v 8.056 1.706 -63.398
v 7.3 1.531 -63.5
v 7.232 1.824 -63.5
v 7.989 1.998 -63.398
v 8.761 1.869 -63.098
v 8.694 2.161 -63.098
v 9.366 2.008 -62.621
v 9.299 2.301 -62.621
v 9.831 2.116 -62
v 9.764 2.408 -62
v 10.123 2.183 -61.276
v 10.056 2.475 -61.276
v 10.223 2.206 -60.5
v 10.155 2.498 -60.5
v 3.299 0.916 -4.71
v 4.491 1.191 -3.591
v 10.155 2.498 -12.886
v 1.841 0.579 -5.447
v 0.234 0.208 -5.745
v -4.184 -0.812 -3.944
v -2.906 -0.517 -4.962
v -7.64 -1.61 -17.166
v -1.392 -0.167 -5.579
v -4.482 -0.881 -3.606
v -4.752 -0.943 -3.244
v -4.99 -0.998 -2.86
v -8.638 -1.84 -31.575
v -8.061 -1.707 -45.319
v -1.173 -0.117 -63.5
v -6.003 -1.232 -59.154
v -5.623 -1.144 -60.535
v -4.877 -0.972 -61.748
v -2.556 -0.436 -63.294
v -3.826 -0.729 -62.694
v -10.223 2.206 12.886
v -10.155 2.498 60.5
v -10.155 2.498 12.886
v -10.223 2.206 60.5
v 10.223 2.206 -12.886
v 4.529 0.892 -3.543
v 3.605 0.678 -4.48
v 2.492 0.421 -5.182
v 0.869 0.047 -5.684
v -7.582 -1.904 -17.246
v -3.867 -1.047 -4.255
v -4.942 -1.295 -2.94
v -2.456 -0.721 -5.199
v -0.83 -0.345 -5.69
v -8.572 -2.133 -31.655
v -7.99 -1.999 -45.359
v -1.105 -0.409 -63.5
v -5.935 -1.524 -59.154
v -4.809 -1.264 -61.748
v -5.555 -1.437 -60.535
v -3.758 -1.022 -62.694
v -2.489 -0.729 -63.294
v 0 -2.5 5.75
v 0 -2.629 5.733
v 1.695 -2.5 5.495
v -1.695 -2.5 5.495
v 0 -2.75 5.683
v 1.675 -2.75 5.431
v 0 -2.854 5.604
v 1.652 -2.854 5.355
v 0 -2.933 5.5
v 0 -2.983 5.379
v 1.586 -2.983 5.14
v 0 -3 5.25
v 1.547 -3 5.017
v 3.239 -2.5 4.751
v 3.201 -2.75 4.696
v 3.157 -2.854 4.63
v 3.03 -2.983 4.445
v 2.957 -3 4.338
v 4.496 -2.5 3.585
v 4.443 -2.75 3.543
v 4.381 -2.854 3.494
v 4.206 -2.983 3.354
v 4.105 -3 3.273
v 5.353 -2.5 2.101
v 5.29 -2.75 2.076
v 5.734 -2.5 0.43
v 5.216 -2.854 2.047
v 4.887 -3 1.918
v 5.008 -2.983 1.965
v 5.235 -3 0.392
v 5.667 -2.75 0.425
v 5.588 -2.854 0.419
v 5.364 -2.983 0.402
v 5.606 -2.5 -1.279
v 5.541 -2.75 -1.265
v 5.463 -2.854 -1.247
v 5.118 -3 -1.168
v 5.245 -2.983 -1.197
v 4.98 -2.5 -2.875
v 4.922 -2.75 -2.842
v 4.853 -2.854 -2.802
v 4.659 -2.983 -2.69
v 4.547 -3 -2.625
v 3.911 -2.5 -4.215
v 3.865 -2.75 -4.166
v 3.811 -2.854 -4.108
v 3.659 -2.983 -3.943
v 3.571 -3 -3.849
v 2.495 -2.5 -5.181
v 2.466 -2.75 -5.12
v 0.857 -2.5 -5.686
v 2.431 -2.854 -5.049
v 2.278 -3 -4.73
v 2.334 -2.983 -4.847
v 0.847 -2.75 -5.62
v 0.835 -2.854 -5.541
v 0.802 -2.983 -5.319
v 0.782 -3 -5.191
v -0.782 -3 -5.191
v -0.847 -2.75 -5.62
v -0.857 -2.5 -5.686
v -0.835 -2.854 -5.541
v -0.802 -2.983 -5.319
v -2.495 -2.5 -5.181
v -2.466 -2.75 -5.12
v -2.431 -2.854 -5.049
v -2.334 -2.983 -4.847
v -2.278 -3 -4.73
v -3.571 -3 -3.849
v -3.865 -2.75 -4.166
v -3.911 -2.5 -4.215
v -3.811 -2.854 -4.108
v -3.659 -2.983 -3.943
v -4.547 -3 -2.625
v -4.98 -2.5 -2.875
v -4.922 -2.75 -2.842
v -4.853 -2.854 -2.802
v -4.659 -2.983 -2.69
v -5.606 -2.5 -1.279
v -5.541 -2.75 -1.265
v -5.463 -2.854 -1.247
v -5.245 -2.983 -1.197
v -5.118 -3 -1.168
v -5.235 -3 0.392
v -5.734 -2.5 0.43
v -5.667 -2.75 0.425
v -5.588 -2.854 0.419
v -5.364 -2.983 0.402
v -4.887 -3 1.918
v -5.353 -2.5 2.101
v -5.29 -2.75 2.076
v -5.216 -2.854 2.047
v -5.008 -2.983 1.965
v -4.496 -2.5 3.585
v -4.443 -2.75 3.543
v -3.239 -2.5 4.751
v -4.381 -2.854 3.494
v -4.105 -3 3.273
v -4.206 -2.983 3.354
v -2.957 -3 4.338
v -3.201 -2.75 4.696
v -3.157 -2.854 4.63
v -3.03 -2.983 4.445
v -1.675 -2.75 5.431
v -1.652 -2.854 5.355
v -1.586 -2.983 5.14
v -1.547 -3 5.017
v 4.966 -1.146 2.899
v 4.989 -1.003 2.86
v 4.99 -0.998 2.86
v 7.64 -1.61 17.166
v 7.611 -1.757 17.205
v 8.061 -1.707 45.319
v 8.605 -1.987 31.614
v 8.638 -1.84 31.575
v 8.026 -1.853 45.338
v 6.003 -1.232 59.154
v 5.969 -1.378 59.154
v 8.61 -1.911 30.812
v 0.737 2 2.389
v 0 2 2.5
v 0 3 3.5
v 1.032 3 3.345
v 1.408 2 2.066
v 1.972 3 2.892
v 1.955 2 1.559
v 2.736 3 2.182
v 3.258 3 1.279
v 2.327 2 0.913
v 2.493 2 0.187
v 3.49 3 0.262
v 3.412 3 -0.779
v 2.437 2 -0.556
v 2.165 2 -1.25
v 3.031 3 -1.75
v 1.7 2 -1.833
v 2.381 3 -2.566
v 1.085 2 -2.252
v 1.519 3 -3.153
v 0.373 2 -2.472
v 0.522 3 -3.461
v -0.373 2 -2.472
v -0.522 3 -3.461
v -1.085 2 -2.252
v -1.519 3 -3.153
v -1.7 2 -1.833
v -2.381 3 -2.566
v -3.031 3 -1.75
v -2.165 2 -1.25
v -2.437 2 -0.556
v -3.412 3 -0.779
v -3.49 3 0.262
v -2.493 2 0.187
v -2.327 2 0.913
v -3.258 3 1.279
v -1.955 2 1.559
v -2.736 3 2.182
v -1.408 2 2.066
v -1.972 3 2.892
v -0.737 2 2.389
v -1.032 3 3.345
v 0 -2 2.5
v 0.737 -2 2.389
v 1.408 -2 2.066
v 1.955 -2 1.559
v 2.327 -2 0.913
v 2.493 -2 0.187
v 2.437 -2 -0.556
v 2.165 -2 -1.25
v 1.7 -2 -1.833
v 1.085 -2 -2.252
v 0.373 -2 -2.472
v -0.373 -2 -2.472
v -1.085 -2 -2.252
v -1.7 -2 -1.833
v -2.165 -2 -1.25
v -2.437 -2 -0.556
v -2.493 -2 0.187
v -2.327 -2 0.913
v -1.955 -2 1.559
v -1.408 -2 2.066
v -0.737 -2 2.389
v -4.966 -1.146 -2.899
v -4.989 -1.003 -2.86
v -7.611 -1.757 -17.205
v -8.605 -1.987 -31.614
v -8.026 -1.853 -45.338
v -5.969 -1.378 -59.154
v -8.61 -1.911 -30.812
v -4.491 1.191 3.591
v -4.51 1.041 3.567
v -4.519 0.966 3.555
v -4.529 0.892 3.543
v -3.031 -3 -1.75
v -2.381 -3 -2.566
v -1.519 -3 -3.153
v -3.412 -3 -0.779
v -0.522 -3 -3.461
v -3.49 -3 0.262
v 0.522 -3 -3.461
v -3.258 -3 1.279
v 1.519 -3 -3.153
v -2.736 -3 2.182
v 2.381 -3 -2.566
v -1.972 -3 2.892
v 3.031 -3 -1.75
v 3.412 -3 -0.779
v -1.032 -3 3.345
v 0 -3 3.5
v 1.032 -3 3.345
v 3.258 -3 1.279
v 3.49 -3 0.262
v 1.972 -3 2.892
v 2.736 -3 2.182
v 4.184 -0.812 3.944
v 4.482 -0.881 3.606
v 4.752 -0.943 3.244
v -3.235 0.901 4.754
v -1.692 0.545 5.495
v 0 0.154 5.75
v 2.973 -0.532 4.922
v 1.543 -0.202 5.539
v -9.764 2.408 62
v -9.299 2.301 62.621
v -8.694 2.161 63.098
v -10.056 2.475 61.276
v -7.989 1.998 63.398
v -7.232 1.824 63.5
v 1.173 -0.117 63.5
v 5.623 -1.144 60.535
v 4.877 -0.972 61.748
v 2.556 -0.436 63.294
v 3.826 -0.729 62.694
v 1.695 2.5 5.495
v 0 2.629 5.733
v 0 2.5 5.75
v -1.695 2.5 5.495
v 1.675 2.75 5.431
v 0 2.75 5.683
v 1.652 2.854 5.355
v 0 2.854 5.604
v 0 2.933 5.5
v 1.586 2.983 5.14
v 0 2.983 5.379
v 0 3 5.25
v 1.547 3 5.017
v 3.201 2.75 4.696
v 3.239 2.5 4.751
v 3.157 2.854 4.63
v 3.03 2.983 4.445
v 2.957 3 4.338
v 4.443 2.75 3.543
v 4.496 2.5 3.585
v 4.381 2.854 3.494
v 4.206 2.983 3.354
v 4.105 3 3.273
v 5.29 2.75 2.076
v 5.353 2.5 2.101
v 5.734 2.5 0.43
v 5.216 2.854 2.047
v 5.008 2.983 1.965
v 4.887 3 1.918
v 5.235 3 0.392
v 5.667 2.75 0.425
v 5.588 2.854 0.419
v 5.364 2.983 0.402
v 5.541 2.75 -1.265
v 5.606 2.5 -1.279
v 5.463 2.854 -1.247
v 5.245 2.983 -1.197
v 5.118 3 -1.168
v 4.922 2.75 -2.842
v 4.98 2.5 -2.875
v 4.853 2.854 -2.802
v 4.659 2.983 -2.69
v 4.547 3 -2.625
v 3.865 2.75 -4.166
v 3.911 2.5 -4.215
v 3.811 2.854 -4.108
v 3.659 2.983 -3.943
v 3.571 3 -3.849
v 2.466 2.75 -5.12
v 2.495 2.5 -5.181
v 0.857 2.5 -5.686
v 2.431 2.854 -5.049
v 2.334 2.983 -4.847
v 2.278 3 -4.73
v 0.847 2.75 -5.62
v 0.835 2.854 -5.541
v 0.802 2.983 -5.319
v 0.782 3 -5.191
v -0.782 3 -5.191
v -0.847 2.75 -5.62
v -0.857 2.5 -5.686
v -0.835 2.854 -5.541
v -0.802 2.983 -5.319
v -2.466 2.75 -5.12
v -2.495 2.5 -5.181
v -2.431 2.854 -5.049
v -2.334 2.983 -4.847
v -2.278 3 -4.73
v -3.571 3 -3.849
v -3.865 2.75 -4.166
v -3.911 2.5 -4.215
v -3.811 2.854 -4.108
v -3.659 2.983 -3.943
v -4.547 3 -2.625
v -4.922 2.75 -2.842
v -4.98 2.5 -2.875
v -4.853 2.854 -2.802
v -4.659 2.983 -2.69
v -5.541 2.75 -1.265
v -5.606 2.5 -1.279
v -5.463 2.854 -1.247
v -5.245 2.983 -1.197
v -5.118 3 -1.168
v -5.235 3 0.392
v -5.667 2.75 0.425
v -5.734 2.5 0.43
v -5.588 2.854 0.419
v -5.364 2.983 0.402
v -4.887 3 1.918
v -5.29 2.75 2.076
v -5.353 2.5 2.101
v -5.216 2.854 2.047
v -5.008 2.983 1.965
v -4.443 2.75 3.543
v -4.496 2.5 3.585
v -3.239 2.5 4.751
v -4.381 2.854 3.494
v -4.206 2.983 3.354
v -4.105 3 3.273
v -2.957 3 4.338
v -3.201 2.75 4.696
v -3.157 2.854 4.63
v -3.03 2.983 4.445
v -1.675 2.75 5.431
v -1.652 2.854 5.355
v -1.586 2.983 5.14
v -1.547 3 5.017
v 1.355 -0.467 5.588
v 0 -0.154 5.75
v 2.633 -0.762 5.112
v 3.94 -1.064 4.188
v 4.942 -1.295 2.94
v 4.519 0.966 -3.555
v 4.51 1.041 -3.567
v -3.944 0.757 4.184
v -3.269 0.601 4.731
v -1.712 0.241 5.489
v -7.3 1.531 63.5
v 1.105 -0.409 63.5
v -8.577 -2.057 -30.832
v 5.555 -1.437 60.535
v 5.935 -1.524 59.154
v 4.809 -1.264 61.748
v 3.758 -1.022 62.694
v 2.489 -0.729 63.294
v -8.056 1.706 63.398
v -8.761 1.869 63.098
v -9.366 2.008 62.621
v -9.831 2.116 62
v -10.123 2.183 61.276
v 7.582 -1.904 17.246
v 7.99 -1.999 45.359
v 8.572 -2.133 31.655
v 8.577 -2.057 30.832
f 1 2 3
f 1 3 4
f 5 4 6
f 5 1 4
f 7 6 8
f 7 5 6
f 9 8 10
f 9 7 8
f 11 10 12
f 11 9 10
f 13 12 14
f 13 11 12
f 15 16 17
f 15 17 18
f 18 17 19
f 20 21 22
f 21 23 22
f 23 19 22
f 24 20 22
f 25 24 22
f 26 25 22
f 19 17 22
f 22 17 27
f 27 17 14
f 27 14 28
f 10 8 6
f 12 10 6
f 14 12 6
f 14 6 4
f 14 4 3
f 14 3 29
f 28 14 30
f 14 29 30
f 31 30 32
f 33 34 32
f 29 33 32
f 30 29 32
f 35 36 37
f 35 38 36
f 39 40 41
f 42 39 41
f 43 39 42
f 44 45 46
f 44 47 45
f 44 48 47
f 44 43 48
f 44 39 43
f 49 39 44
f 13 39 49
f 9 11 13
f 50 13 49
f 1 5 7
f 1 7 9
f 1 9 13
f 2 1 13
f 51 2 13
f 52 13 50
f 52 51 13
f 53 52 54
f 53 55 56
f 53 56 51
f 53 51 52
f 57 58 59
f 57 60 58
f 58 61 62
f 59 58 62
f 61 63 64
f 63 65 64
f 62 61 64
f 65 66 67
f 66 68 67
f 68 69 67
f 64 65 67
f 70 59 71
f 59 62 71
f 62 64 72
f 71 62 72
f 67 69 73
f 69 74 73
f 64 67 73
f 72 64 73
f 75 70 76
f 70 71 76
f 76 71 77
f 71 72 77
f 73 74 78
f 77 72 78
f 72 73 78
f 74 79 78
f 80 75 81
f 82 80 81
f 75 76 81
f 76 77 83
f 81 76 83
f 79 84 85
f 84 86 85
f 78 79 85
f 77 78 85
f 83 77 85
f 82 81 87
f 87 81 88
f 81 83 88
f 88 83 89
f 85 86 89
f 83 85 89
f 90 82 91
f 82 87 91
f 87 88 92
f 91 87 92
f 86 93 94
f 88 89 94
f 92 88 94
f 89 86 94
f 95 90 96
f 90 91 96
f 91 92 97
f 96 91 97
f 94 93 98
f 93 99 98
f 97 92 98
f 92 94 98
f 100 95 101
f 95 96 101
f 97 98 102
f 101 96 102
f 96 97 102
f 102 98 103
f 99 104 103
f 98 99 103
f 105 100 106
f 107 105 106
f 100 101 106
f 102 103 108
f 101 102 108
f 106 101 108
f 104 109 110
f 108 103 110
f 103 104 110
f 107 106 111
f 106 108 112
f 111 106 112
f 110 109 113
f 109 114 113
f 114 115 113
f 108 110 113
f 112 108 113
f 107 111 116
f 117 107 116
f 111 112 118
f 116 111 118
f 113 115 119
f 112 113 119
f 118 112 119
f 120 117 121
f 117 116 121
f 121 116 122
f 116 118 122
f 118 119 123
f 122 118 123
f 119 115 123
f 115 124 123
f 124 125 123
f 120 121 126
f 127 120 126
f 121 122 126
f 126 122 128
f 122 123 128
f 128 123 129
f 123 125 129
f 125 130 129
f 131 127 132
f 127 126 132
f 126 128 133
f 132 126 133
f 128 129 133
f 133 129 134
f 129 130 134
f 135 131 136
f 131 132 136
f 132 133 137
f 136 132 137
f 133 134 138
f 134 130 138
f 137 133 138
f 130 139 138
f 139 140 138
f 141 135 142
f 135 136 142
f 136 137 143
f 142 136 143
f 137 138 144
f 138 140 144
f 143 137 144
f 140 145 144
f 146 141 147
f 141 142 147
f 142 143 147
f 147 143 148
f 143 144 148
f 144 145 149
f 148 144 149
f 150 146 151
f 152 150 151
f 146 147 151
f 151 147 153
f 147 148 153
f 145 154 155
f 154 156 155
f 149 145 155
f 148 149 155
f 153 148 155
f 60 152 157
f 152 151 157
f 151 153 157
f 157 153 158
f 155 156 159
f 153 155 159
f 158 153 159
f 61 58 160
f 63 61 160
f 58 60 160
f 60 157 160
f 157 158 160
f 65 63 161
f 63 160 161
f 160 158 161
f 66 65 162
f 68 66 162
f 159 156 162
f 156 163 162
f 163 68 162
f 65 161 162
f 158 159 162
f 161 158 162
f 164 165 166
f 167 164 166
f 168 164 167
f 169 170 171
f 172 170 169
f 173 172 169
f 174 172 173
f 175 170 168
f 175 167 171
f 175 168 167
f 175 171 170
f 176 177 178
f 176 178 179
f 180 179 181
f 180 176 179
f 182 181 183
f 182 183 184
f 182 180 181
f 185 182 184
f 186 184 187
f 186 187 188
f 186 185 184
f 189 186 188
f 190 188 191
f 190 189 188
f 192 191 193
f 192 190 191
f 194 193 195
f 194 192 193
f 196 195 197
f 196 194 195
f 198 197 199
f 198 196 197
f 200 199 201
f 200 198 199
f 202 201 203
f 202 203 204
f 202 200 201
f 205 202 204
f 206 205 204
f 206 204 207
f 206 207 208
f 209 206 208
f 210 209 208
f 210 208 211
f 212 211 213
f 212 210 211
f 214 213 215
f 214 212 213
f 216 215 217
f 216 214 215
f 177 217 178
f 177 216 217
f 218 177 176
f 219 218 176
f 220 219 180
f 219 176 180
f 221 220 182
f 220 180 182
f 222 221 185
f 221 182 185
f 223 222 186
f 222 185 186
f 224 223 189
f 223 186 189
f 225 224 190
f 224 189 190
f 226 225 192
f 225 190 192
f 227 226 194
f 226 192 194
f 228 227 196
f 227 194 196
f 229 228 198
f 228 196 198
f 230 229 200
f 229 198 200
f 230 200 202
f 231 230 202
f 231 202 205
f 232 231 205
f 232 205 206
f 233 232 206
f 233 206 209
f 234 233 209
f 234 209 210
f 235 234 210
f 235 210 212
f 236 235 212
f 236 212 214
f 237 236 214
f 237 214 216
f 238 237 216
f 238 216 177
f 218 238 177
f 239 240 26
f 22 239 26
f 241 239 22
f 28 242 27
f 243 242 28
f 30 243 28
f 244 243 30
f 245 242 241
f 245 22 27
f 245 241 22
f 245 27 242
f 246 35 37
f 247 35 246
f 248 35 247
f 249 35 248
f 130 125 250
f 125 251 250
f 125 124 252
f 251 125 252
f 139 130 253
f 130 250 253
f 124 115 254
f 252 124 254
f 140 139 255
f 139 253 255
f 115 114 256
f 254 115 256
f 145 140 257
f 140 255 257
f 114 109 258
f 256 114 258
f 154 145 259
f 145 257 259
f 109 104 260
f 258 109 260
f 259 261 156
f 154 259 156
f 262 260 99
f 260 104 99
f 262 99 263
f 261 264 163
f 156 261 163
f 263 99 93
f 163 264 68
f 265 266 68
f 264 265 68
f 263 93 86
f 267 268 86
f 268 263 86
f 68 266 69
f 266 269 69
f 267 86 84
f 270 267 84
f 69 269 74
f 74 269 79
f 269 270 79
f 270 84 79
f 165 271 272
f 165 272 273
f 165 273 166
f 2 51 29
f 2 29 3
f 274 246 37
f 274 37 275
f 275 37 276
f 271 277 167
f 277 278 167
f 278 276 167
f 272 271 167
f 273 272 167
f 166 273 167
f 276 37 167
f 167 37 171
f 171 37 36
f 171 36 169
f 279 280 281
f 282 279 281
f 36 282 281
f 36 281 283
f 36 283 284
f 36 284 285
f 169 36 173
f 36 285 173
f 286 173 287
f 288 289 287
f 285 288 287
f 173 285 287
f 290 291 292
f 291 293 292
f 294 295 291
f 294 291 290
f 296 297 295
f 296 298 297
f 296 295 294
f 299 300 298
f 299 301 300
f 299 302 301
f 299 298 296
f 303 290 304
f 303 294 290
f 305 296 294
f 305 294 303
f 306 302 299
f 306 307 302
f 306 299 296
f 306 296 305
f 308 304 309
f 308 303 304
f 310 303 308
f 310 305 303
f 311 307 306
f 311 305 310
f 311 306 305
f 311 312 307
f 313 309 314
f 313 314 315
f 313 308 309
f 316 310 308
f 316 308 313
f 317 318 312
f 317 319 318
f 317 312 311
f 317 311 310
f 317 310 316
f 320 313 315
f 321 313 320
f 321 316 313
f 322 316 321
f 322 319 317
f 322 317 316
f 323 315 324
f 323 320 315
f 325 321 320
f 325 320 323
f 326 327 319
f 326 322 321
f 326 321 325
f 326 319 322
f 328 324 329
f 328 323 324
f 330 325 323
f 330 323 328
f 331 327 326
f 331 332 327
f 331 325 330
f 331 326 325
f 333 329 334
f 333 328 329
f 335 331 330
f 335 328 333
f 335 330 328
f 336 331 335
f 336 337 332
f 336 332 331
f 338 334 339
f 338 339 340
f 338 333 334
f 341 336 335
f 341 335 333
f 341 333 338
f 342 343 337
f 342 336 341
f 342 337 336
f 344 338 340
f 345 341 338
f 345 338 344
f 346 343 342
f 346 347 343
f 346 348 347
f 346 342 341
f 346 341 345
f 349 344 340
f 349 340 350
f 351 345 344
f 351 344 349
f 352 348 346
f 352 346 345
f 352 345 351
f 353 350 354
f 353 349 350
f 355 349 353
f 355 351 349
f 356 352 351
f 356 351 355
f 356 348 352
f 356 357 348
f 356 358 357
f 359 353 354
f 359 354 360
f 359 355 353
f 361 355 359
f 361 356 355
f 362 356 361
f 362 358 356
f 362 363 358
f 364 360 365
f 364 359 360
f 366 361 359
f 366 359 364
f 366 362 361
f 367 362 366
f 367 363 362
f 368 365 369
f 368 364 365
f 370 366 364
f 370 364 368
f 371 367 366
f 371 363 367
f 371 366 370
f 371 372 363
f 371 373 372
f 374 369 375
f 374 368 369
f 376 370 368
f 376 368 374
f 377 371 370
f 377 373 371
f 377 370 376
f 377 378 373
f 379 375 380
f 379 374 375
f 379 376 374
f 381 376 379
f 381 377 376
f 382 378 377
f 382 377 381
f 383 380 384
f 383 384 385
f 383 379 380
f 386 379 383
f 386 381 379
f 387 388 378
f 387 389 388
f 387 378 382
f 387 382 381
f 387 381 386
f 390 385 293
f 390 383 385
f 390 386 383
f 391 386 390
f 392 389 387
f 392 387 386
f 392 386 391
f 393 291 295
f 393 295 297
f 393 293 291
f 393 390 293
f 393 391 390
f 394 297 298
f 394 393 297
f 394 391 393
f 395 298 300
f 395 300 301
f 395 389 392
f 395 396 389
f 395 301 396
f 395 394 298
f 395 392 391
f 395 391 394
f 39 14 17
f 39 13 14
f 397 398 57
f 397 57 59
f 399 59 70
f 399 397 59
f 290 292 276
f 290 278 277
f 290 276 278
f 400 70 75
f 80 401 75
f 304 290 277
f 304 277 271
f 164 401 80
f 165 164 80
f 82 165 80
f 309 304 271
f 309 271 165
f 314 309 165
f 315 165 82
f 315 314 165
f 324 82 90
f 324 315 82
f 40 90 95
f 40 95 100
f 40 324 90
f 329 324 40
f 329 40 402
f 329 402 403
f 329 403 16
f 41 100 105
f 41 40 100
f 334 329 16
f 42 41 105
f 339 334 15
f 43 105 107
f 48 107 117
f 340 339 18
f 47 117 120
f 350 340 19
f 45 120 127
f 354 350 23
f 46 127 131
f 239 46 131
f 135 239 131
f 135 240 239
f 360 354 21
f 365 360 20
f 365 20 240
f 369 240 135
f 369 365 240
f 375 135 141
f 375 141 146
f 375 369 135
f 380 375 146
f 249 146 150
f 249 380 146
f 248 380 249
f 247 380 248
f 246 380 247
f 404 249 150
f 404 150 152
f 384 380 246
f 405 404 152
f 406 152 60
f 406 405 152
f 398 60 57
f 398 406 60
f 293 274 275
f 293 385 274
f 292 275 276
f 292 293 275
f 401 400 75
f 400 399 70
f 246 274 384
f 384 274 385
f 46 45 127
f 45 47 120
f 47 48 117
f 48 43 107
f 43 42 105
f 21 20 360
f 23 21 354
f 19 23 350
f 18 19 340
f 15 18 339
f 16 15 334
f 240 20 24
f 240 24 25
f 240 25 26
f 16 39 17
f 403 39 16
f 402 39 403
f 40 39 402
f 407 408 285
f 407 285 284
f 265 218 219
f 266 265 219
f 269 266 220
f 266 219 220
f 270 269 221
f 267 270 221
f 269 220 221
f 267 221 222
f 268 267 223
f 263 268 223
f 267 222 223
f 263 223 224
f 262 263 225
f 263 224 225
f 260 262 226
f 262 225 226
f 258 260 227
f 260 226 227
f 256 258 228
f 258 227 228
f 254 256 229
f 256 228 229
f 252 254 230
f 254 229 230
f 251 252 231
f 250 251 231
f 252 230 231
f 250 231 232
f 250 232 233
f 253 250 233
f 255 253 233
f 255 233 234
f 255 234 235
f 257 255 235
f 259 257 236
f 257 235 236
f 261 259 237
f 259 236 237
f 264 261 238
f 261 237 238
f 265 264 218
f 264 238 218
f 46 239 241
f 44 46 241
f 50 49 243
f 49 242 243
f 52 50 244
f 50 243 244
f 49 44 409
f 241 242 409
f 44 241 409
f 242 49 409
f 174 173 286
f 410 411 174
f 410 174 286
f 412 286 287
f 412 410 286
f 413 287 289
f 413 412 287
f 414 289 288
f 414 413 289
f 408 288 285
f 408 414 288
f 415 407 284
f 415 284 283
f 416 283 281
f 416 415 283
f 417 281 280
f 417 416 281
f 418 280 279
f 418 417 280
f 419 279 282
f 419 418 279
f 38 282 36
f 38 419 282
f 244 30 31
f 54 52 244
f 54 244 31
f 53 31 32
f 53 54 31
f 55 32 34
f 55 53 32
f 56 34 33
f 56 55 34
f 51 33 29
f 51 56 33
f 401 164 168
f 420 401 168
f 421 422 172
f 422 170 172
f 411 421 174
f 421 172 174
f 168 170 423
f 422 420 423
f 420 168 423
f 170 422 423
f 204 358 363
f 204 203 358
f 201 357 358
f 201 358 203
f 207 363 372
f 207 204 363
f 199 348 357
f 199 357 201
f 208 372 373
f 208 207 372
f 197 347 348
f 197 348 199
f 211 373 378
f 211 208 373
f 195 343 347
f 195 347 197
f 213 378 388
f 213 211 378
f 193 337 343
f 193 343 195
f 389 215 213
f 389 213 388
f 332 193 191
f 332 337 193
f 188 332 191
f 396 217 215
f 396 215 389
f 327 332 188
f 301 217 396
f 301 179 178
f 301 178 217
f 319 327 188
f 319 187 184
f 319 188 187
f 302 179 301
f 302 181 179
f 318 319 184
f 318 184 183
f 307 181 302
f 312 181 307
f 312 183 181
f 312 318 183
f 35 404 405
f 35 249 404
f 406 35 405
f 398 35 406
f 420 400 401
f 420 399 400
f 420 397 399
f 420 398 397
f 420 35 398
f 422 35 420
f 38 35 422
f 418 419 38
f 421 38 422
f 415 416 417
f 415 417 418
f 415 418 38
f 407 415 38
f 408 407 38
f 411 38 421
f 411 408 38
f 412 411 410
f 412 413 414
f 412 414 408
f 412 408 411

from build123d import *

# Parameters (mm, degrees)
SKETCH1_R           = 5.75
BOSS_EXTRUDE1_DEPTH = 3
BOSS_EXTRUDE3_DEPTH = 0.15
CIRPATTERN1_COUNT   = 2
SKETCH5_R           = 2.5
CUT_EXTRUDE1_DEPTH  = 65.596843827
FILLET1_R           = 0.5
FILLET2_SIZE        = 1


with BuildPart() as part:
    # Sketch1 → Boss-Extrude1 (new, symmetric)
    with BuildSketch(Plane(origin=(0, 0, 0), x_dir=(1, 0, 0), z_dir=(0, 1, 0))):
        Circle(SKETCH1_R)
    extrude(amount=BOSS_EXTRUDE1_DEPTH, both=True)

    # Sketch3 → Boss-Extrude3 (add, symmetric)
    with BuildSketch(Plane(origin=(0, 0, 0), x_dir=(0.9743700647852351, -0.22495105434386542, 0), z_dir=(-0.22495105434386542, -0.9743700647852351, 0))):
        with BuildLine():
            Line((-10.456899563, 12.886138045), (-4.185847137, 2.859510833))
            ThreePointArc((-4.185847137, 2.859510833), (0.450269951, 5.535994412), (5.086387038, 2.859510833))
            add(Edge.make_bspline(
                [(5.086387038, 2.859510833), (5.150424067, 3.115433935), (5.21336865, 3.371423248)],
                knots=[0, 0, 0, 0.009219812, 0.009219812, 0.009219812], degree=2))
            add(Edge.make_bspline(
                [(5.21336865, 3.371423248), (11.977524608, 30.880567729), (6.126015088, 59.154329089)],
                knots=[0.009219812, 0.009219812, 0.009219812, 1, 1, 1], degree=2))
            ThreePointArc((6.126015088, 59.154329089), (4.465099784, 62.259763653), (1.16901464, 63.5))
            Line((1.16901464, 63.5), (-7.456899563, 63.5))
            ThreePointArc((-7.456899563, 63.5), (-9.578219907, 62.621320344), (-10.456899563, 60.5))
            Line((-10.456899563, 60.5), (-10.456899563, 12.886138045))
        make_face()
    boss_extrude3 = extrude(amount=BOSS_EXTRUDE3_DEPTH, both=True)

    # CirPattern1: Boss-Extrude3 ×2 about axis
    cirpattern1_axis = Axis((0, 3, 0), (0, -1, 0))
    for i in range(1, CIRPATTERN1_COUNT):
        add(boss_extrude3.rotate(cirpattern1_axis, i * 360 / CIRPATTERN1_COUNT))

    # Sketch5 → Cut-Extrude1 (cut, through all)
    with BuildSketch(Plane(origin=(0, 3, 0), x_dir=(1, 0, 0), z_dir=(0, 1, 0))):
        Circle(SKETCH5_R)
    extrude(amount=-CUT_EXTRUDE1_DEPTH, mode=Mode.SUBTRACT)

    # Fillet1
    fillet1_edges = [part.edges().sort_by_distance(p)[0] for p in [
        (-5.75, -3, 0),
        (-5.75, 3, 0),
    ]]
    fillet(fillet1_edges, radius=FILLET1_R)

    # Fillet2
    fillet2_edges = [part.edges().sort_by_distance(p)[0] for p in [
        (-2.5, -3, 0),
        (-2.5, 3, 0),
    ]]
    chamfer(fillet2_edges, length=FILLET2_SIZE)


solid = part.part
